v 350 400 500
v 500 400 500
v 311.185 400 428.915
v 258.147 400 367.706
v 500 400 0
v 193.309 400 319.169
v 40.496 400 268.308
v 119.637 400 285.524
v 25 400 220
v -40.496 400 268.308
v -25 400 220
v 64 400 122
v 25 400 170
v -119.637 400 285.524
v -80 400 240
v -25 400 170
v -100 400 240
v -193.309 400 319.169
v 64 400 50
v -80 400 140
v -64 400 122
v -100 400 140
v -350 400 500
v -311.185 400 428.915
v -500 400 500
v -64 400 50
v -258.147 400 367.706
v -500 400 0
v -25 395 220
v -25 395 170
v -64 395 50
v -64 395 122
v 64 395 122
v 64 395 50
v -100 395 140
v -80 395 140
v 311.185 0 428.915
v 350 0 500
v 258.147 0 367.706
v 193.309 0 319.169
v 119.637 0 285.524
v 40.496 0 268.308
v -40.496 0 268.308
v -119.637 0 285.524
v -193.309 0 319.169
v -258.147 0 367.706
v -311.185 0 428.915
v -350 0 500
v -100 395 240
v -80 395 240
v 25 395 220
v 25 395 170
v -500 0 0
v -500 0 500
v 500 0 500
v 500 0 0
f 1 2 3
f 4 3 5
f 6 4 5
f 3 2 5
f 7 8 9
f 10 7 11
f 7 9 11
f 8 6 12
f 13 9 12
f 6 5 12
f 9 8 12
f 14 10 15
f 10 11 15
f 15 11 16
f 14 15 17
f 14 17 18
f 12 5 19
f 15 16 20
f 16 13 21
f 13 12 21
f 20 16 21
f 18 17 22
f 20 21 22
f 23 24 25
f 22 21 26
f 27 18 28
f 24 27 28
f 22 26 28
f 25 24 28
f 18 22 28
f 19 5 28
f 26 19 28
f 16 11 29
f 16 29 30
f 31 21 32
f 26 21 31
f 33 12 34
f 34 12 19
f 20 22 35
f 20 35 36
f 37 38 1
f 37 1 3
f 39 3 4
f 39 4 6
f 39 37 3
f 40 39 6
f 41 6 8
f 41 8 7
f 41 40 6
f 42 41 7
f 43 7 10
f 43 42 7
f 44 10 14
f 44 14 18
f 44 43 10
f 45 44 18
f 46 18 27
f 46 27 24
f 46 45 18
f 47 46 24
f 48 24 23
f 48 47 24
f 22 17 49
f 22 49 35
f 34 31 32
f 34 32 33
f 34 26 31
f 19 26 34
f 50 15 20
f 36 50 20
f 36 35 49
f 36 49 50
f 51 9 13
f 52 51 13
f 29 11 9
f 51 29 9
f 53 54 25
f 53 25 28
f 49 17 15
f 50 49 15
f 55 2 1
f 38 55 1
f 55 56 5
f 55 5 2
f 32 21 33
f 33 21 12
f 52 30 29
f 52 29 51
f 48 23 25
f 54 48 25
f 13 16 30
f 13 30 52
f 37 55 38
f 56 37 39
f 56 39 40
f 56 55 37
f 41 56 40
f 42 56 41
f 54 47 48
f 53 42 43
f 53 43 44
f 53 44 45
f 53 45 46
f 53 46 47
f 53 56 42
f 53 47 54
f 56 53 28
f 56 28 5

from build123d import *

# Parameters (mm, degrees)
EXTRUDE_1_DEPTH     = 400
SKETCH_2_W          = 128
SKETCH_2_H          = 72
CUT_EXTRUDE_1_DEPTH = 5
SKETCH_3_W          = 50
SKETCH_3_H          = 50
CUT_EXTRUDE_3_DEPTH = 5
SKETCH_4_W          = 20
SKETCH_4_H          = 100
CUT_EXTRUDE_4_DEPTH = 5


with BuildPart() as part:
    # 草图1 → 凸台-拉伸1 (new body)
    with BuildSketch(Plane(origin=(0, 0, 0), x_dir=(1, 0, 0), z_dir=(0, 1, 0))):
        with BuildLine():
            Line((0, 0), (500, 0))
            Line((500, 0), (500, -500))
            Line((500, -500), (350, -500))
            ThreePointArc((350, -500), (0, -266.137476728), (-350, -500))
            Line((-350, -500), (-500, -500))
            Line((-500, -500), (-500, 0))
            Line((-500, 0), (0, 0))
        make_face()
    extrude(amount=EXTRUDE_1_DEPTH)

    # 草图2 → 切除-拉伸1 (cut)
    with BuildSketch(Plane(origin=(0, 400, 0), x_dir=(1, 0, 0), z_dir=(0, 1, 0))):
        with Locations((0, -86)):
            Rectangle(SKETCH_2_W, SKETCH_2_H)
    extrude(amount=-CUT_EXTRUDE_1_DEPTH, mode=Mode.SUBTRACT)

    # 草图3 → 切除-拉伸3 (cut)
    with BuildSketch(Plane(origin=(0, 400, 0), x_dir=(1, 0, 0), z_dir=(0, 1, 0))):
        with Locations((0, -195)):
            Rectangle(SKETCH_3_W, SKETCH_3_H)
    extrude(amount=-CUT_EXTRUDE_3_DEPTH, mode=Mode.SUBTRACT)

    # 草图4 → 切除-拉伸4 (cut)
    with BuildSketch(Plane(origin=(0, 400, 0), x_dir=(1, 0, 0), z_dir=(0, 1, 0))):
        with Locations((-90, -190)):
            Rectangle(SKETCH_4_W, SKETCH_4_H)
    extrude(amount=-CUT_EXTRUDE_4_DEPTH, mode=Mode.SUBTRACT)


solid = part.part
